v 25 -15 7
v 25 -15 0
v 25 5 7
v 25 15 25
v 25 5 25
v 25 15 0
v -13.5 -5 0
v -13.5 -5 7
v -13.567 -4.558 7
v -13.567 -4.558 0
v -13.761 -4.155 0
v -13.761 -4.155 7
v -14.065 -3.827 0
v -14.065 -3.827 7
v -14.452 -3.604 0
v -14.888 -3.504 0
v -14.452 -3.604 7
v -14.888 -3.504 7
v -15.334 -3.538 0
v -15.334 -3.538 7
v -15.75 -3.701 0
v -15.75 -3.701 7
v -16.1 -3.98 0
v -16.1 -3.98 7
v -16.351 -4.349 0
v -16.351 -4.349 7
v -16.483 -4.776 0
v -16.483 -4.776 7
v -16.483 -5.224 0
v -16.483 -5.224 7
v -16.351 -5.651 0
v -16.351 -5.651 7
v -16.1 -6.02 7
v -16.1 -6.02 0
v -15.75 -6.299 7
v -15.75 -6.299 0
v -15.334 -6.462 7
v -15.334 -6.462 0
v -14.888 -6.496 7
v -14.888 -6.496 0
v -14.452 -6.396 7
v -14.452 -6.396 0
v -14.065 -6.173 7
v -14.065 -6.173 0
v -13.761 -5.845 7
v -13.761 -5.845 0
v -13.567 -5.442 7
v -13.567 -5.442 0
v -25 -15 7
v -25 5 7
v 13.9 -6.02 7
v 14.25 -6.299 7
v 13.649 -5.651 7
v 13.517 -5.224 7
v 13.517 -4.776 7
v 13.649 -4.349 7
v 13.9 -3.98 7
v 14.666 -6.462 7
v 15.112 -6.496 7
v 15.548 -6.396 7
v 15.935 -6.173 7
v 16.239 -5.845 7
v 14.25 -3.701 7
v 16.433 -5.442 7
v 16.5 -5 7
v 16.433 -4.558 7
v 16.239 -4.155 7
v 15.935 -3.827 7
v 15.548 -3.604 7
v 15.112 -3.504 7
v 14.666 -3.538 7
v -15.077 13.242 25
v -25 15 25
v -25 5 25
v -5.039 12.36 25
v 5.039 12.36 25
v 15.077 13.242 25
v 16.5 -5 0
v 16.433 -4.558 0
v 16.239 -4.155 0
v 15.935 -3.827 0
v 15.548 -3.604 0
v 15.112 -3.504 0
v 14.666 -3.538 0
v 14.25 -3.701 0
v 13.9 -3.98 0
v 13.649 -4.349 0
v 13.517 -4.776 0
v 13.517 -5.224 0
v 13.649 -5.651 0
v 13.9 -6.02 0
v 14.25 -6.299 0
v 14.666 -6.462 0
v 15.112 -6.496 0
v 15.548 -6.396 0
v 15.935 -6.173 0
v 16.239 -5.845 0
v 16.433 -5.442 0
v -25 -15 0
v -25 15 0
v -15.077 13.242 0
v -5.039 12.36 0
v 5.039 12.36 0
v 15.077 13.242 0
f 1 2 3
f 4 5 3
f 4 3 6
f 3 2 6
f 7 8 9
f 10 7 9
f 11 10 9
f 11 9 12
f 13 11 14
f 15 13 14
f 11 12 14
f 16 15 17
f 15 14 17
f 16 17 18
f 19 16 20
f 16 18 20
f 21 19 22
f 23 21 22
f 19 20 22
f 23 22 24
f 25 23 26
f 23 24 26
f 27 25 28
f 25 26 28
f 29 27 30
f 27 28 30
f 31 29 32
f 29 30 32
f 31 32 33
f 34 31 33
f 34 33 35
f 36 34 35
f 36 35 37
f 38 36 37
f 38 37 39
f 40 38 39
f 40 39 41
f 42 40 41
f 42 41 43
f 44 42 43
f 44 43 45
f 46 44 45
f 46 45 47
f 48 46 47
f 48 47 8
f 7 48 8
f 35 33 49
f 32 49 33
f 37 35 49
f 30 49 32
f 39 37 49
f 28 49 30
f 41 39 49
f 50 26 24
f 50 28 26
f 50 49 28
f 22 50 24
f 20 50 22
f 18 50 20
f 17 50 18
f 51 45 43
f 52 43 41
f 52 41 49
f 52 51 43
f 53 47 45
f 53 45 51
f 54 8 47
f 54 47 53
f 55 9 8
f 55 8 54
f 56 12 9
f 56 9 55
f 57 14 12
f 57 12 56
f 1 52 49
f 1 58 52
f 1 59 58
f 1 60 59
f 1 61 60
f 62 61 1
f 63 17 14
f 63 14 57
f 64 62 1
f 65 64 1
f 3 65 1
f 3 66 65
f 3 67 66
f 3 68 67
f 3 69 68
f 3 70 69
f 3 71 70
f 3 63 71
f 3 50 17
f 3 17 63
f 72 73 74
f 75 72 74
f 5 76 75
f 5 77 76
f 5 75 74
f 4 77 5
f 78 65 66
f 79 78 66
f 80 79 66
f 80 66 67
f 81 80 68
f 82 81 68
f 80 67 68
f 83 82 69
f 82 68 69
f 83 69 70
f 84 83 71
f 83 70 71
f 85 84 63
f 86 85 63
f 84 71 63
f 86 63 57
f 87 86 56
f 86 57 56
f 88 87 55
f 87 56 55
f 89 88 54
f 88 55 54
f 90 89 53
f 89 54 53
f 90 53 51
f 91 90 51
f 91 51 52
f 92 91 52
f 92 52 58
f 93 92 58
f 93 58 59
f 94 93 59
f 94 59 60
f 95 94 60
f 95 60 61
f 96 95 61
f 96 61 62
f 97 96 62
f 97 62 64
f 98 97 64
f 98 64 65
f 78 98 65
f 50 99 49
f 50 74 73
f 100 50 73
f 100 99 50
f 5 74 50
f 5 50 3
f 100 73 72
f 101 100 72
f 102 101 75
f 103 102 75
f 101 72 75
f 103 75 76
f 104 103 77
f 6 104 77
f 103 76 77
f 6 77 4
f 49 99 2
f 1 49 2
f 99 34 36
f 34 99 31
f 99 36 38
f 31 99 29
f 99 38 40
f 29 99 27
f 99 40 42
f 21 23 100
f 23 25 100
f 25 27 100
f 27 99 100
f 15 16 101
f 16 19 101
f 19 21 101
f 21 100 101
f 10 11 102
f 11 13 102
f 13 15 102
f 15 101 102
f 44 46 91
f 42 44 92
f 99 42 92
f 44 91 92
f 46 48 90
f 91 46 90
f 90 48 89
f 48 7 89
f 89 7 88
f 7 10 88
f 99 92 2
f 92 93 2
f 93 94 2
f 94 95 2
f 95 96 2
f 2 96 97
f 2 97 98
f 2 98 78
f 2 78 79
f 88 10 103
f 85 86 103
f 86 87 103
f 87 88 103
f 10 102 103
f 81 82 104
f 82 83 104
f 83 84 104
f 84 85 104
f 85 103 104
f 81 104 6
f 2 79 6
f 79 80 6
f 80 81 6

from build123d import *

# Parameters (mm, degrees)
F0_W     = 50
F0_H     = 30
F1_DEPTH = 25
F3_DEPTH = 25
F4_W     = 50
F4_H     = 20
F5_DEPTH = 18
F6_R     = 1.5
F7_DEPTH = 25


with BuildPart() as f1:
    # F0 (on Top) → F1 (new body)
    with BuildSketch(Plane.XY):
        Rectangle(F0_W, F0_H)
    extrude(amount=F1_DEPTH)

    # F2 (on face) → F3 (cut)
    with BuildSketch(Plane.XY.offset(25)):
        with BuildLine():
            Line((25, 15), (-25, 15))
            ThreePointArc((-25, 15), (0, 12.249722), (25, 15))
        make_face()
    extrude(amount=-F3_DEPTH, mode=Mode.SUBTRACT)

    # F4 (on face) → F5 (cut)
    with BuildSketch(Plane.XY.offset(25)):
        with Locations((0, -5)):
            Rectangle(F4_W, F4_H)
    extrude(amount=-F5_DEPTH, mode=Mode.SUBTRACT)

    # F6 (on face) → F7 (cut)
    with BuildSketch(Plane.XY.offset(7)):
        with Locations((-15, -5)):
            Circle(F6_R)
        with Locations((15, -5)):
            Circle(F6_R)
    extrude(amount=-F7_DEPTH, mode=Mode.SUBTRACT)


solid = f1.part
